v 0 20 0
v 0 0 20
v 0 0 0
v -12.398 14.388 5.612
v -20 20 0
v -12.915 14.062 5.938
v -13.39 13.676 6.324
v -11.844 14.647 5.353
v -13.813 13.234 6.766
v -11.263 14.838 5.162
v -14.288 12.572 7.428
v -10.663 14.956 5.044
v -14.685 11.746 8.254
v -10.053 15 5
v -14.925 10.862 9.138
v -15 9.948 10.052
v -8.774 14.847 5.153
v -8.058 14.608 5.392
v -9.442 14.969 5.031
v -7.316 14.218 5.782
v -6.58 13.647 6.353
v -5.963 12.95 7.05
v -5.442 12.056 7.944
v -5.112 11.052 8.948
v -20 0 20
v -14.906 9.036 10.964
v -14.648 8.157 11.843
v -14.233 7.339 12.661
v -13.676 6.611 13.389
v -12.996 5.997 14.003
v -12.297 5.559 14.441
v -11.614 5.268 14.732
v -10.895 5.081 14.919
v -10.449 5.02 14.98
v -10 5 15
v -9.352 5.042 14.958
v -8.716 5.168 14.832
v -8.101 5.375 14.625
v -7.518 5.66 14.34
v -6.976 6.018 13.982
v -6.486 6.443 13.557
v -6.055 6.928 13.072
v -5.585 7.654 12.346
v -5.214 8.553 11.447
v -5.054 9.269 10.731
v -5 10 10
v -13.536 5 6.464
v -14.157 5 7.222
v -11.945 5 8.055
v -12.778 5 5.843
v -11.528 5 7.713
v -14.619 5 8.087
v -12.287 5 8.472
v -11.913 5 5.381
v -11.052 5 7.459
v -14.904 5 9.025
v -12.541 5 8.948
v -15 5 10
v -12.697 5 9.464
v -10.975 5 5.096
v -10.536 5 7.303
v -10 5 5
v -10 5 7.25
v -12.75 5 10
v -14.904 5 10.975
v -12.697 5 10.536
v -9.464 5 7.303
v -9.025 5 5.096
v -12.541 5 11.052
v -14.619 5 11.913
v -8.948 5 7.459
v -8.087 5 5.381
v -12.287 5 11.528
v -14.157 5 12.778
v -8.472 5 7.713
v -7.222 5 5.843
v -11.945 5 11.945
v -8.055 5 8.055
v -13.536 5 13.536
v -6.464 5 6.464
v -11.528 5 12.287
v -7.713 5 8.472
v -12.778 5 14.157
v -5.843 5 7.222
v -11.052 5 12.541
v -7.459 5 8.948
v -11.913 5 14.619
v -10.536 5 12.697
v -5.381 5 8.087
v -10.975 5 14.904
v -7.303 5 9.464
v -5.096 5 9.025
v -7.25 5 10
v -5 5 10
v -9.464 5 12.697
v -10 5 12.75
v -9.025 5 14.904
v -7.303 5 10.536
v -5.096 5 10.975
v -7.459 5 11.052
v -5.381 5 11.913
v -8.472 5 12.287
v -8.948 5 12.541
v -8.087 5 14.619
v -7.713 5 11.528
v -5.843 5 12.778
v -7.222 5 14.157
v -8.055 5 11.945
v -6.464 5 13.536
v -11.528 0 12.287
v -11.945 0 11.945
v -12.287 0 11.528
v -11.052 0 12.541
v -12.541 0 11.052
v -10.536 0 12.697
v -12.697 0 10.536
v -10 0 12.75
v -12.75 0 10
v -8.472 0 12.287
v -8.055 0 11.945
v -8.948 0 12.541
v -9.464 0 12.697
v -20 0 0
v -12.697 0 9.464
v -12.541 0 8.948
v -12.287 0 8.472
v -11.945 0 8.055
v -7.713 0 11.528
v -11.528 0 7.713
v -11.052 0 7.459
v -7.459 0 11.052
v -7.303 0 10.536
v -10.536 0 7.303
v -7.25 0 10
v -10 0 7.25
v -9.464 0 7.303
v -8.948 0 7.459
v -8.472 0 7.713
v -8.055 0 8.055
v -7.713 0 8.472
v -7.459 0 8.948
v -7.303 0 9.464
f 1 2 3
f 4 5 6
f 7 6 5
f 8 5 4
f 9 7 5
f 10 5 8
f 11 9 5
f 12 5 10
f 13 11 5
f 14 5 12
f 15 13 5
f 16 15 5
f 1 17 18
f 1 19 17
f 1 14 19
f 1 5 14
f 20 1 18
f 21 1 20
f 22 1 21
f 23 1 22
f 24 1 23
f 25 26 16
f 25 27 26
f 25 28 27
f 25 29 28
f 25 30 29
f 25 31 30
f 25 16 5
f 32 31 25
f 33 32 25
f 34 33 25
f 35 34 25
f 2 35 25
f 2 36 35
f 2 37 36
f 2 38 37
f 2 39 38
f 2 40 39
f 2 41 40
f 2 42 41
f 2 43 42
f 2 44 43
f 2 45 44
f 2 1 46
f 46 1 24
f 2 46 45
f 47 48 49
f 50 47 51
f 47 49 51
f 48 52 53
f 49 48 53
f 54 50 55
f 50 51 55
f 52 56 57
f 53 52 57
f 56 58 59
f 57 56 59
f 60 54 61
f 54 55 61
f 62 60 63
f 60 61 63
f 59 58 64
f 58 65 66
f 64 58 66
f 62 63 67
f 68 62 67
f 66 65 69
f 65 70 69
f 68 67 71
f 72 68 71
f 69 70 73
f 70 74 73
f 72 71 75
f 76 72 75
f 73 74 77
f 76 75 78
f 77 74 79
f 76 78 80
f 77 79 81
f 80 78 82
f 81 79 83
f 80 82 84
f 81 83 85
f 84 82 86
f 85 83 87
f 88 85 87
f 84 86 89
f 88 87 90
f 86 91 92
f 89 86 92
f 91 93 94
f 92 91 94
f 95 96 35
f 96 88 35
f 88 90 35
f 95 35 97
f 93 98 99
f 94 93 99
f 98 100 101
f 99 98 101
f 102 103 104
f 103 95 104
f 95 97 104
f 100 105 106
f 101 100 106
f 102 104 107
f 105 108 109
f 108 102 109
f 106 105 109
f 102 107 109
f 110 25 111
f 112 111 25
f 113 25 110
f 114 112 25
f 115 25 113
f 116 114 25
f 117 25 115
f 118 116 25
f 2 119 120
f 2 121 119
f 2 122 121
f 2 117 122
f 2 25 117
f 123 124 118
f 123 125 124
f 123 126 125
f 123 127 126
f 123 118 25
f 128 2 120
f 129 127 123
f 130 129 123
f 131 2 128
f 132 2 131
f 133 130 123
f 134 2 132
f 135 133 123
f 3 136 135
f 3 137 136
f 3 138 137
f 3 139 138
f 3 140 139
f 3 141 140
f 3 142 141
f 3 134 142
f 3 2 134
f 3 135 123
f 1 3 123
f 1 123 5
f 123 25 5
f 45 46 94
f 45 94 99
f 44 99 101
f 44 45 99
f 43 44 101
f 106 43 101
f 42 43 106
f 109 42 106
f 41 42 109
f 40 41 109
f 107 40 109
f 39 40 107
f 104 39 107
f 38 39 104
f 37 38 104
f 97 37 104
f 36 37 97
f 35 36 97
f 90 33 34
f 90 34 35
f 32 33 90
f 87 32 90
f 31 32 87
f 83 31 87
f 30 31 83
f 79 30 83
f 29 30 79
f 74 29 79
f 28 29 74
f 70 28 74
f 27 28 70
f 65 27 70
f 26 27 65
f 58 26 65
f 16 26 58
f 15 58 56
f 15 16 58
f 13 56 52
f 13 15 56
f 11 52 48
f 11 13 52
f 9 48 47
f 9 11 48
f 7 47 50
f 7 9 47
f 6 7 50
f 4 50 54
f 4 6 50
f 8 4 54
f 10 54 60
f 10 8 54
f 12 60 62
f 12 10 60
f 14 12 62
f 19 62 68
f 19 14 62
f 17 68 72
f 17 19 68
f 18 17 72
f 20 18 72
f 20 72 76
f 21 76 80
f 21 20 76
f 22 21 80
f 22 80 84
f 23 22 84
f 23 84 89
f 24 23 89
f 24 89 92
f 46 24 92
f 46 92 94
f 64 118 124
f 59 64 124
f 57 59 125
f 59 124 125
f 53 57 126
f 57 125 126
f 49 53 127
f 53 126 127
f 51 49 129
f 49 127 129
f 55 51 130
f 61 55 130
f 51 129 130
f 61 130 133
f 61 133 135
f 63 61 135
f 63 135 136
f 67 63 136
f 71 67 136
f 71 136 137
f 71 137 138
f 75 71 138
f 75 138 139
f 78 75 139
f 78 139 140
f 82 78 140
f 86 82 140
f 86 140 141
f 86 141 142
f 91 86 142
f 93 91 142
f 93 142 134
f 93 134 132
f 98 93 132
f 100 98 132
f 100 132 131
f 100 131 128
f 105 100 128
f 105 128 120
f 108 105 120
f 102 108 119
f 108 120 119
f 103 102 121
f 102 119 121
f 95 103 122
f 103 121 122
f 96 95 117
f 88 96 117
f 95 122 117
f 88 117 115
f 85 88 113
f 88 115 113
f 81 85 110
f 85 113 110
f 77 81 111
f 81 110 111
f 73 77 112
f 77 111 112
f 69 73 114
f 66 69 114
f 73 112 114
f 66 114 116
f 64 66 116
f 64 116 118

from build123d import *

# Parameters (mm, degrees)
F1_DEPTH = 20
F4_D     = 5.5
F3_R     = 5
F5_DEPTH = 15


with BuildPart() as f1:
    # F0 (on Right) → F1 (new body)
    with BuildSketch(Plane.YZ):
        Polygon((0, 20), (0, 0), (20, 0), align=None)
    extrude(amount=-F1_DEPTH)

    # F4 (through all)
    with Locations(Plane(origin=(0, 20, 0), x_dir=(1, 0, 0), z_dir=(0, 1, 0))):
        with Locations((-10, -10)):
            Hole(F4_D / 2)

    # F3 (on offset) → F5 (cut)
    with BuildSketch(Plane.XZ.offset(-20)):
        with Locations((-10, 10)):
            Circle(F3_R)
    extrude(amount=F5_DEPTH, mode=Mode.SUBTRACT)


solid = f1.part
